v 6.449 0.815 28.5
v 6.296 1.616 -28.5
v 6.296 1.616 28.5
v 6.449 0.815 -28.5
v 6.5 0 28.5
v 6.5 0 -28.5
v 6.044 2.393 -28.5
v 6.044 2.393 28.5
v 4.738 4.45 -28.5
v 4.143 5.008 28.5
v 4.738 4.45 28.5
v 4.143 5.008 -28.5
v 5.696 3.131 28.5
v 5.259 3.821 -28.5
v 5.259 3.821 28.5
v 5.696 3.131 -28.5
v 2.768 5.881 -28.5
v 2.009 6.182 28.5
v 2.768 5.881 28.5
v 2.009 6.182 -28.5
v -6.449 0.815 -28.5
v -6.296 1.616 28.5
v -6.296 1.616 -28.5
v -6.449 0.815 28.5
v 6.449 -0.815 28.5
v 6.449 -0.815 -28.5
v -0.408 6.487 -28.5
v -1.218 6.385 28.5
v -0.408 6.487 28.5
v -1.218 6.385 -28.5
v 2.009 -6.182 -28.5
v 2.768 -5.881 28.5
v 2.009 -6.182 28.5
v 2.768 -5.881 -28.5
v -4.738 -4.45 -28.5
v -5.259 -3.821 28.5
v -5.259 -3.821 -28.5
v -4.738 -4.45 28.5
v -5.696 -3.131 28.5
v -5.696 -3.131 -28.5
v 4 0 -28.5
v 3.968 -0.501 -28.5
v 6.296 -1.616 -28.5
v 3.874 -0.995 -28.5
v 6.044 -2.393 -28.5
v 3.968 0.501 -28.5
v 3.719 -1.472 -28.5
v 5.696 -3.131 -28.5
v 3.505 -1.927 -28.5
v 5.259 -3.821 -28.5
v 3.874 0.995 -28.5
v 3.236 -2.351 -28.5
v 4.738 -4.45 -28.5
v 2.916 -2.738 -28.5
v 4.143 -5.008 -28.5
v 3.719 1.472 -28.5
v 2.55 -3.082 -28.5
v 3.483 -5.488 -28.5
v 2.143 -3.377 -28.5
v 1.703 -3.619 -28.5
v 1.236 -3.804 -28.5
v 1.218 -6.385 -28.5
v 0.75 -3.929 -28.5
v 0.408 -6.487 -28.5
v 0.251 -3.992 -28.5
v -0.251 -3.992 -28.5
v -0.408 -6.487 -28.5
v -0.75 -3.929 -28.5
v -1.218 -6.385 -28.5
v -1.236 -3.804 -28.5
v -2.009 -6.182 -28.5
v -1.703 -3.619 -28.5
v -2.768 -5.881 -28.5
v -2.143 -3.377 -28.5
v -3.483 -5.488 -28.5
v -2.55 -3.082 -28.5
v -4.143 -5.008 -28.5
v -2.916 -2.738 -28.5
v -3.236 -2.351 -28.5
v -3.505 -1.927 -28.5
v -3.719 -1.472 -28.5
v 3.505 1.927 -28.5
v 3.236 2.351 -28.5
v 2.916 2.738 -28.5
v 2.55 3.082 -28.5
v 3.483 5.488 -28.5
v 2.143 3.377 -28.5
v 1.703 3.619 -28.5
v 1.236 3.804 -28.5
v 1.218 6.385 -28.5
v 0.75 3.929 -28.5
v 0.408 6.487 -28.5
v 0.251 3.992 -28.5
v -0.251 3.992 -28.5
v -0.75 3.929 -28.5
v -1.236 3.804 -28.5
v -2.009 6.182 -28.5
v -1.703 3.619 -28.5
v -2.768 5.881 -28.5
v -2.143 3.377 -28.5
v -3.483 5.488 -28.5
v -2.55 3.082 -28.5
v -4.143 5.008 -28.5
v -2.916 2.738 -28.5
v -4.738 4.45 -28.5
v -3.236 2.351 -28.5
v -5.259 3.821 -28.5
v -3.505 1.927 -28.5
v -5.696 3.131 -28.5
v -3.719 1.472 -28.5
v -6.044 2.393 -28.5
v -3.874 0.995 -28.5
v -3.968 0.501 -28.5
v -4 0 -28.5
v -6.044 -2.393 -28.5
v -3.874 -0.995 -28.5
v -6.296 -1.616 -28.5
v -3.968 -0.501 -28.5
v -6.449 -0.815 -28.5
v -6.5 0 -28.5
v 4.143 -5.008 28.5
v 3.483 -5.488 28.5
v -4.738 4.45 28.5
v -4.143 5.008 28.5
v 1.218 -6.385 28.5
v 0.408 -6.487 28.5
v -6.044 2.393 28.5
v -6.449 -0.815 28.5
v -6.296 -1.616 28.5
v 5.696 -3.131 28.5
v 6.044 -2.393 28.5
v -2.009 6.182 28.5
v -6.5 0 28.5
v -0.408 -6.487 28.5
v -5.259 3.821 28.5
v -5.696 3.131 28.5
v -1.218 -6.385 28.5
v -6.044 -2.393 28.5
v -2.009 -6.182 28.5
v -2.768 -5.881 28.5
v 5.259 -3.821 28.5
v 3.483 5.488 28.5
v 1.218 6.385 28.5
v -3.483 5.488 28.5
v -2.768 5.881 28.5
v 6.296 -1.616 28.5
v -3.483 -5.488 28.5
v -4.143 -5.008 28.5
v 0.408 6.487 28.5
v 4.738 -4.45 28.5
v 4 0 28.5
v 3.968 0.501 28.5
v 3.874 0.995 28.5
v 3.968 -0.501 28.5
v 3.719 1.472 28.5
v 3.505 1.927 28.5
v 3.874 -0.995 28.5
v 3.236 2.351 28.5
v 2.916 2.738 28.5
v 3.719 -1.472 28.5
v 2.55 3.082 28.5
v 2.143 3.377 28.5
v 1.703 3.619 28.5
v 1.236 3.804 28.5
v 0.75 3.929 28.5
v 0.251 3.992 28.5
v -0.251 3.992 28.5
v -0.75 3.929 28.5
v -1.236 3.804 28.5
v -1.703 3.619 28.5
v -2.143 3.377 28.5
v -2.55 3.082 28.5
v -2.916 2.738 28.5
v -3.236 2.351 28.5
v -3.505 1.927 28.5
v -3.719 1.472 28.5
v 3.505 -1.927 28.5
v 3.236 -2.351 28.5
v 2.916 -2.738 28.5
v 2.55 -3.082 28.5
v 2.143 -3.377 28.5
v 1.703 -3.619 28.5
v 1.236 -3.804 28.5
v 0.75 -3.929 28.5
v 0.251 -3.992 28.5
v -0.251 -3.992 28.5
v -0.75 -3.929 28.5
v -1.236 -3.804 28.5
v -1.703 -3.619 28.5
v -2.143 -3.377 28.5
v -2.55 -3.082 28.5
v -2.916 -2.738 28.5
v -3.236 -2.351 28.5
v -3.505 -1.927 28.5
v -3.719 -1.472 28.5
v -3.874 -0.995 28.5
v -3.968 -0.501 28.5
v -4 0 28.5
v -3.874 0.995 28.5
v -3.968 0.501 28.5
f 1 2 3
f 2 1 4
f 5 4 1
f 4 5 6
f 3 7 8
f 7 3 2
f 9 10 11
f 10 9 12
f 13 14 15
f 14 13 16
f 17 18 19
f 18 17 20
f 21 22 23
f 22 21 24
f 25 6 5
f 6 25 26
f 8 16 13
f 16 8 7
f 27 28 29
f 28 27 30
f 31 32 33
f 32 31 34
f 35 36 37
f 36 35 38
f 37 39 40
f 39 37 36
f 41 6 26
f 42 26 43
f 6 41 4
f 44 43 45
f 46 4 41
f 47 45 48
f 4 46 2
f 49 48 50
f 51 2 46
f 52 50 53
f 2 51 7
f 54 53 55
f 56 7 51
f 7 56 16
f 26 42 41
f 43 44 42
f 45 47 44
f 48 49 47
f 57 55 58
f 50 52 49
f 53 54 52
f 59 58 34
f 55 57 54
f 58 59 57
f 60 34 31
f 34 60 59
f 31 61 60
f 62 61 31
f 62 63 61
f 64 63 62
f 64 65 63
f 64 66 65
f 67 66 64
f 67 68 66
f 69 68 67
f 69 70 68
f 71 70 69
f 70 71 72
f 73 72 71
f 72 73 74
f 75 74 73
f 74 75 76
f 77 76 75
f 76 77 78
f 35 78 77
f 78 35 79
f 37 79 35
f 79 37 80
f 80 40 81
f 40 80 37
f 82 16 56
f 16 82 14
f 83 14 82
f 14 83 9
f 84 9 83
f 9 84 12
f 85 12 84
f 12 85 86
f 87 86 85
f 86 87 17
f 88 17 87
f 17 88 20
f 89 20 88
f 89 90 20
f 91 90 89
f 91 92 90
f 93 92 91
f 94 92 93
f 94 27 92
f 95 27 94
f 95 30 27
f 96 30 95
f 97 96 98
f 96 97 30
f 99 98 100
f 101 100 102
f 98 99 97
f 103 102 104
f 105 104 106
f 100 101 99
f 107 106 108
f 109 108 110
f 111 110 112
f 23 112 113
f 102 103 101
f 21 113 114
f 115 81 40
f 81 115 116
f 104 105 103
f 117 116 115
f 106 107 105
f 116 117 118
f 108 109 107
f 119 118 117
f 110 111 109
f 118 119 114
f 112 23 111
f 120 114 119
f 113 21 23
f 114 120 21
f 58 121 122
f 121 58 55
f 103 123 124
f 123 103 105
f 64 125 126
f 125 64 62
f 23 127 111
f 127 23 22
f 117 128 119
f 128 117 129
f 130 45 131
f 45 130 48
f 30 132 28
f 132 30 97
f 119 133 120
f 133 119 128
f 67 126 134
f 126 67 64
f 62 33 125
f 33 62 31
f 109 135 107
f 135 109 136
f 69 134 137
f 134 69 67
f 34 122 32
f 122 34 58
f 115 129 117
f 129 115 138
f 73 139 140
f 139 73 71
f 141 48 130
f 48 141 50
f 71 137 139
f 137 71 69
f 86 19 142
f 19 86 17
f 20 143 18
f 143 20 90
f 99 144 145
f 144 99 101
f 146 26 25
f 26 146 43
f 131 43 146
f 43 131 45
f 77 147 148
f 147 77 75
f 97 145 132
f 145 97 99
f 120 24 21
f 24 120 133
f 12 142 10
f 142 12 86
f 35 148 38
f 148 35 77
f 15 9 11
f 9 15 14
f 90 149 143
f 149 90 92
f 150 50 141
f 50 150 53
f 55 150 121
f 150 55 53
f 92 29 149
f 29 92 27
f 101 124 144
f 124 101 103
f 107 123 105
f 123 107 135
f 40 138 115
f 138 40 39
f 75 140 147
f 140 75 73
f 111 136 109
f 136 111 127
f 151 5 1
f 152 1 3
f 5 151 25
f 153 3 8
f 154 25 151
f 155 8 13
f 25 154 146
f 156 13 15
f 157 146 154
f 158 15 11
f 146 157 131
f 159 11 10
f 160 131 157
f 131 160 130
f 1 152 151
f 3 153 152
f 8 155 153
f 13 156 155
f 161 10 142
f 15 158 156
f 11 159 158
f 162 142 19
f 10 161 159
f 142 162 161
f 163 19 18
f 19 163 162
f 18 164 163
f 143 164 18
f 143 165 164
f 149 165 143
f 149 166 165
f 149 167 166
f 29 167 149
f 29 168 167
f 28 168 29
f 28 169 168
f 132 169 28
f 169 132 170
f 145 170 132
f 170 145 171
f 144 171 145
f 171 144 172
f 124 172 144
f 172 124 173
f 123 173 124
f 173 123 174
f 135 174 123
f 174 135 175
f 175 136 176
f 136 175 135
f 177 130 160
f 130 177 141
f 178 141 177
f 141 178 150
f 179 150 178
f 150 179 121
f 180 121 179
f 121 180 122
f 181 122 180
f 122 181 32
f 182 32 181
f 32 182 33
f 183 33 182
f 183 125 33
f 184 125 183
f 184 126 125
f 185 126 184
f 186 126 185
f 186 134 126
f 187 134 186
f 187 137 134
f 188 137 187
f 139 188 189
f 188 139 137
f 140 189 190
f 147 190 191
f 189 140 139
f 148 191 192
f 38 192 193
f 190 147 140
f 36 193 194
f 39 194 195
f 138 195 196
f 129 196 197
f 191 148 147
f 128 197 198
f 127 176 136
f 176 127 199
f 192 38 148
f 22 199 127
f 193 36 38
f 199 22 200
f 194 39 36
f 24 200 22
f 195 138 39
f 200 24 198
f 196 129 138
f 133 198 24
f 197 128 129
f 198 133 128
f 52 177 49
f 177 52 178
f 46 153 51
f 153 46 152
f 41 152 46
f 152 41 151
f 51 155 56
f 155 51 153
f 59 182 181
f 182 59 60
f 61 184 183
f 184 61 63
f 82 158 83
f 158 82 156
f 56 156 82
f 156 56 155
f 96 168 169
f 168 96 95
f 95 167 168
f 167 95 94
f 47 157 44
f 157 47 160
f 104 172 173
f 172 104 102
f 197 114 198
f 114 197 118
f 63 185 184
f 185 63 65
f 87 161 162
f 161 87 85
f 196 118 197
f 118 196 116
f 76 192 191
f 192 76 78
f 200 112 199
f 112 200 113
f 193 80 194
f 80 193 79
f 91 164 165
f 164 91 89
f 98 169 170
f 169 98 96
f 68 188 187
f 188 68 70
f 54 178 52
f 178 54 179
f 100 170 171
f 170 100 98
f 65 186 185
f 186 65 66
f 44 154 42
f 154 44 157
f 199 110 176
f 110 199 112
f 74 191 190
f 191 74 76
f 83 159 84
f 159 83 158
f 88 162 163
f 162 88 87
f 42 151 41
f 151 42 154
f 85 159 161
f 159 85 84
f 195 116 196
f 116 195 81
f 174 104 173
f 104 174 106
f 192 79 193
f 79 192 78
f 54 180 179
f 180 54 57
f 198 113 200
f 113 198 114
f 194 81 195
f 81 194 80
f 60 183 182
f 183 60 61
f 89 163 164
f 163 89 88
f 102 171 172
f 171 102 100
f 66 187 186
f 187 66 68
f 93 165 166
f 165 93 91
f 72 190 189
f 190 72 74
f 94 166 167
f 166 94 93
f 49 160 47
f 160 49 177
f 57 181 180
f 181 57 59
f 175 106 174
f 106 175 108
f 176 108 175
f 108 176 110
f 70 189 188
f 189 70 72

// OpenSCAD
$fn = 50;


difference() {
	union() {
		translate(v = [0, 0, -28.5000000000]) {
			cylinder(h = 57, r = 6.5000000000);
		}
	}
	union() {
		translate(v = [0, 0, -100.0000000000]) {
			cylinder(h = 200, r = 4.0000000000);
		}
	}
}
